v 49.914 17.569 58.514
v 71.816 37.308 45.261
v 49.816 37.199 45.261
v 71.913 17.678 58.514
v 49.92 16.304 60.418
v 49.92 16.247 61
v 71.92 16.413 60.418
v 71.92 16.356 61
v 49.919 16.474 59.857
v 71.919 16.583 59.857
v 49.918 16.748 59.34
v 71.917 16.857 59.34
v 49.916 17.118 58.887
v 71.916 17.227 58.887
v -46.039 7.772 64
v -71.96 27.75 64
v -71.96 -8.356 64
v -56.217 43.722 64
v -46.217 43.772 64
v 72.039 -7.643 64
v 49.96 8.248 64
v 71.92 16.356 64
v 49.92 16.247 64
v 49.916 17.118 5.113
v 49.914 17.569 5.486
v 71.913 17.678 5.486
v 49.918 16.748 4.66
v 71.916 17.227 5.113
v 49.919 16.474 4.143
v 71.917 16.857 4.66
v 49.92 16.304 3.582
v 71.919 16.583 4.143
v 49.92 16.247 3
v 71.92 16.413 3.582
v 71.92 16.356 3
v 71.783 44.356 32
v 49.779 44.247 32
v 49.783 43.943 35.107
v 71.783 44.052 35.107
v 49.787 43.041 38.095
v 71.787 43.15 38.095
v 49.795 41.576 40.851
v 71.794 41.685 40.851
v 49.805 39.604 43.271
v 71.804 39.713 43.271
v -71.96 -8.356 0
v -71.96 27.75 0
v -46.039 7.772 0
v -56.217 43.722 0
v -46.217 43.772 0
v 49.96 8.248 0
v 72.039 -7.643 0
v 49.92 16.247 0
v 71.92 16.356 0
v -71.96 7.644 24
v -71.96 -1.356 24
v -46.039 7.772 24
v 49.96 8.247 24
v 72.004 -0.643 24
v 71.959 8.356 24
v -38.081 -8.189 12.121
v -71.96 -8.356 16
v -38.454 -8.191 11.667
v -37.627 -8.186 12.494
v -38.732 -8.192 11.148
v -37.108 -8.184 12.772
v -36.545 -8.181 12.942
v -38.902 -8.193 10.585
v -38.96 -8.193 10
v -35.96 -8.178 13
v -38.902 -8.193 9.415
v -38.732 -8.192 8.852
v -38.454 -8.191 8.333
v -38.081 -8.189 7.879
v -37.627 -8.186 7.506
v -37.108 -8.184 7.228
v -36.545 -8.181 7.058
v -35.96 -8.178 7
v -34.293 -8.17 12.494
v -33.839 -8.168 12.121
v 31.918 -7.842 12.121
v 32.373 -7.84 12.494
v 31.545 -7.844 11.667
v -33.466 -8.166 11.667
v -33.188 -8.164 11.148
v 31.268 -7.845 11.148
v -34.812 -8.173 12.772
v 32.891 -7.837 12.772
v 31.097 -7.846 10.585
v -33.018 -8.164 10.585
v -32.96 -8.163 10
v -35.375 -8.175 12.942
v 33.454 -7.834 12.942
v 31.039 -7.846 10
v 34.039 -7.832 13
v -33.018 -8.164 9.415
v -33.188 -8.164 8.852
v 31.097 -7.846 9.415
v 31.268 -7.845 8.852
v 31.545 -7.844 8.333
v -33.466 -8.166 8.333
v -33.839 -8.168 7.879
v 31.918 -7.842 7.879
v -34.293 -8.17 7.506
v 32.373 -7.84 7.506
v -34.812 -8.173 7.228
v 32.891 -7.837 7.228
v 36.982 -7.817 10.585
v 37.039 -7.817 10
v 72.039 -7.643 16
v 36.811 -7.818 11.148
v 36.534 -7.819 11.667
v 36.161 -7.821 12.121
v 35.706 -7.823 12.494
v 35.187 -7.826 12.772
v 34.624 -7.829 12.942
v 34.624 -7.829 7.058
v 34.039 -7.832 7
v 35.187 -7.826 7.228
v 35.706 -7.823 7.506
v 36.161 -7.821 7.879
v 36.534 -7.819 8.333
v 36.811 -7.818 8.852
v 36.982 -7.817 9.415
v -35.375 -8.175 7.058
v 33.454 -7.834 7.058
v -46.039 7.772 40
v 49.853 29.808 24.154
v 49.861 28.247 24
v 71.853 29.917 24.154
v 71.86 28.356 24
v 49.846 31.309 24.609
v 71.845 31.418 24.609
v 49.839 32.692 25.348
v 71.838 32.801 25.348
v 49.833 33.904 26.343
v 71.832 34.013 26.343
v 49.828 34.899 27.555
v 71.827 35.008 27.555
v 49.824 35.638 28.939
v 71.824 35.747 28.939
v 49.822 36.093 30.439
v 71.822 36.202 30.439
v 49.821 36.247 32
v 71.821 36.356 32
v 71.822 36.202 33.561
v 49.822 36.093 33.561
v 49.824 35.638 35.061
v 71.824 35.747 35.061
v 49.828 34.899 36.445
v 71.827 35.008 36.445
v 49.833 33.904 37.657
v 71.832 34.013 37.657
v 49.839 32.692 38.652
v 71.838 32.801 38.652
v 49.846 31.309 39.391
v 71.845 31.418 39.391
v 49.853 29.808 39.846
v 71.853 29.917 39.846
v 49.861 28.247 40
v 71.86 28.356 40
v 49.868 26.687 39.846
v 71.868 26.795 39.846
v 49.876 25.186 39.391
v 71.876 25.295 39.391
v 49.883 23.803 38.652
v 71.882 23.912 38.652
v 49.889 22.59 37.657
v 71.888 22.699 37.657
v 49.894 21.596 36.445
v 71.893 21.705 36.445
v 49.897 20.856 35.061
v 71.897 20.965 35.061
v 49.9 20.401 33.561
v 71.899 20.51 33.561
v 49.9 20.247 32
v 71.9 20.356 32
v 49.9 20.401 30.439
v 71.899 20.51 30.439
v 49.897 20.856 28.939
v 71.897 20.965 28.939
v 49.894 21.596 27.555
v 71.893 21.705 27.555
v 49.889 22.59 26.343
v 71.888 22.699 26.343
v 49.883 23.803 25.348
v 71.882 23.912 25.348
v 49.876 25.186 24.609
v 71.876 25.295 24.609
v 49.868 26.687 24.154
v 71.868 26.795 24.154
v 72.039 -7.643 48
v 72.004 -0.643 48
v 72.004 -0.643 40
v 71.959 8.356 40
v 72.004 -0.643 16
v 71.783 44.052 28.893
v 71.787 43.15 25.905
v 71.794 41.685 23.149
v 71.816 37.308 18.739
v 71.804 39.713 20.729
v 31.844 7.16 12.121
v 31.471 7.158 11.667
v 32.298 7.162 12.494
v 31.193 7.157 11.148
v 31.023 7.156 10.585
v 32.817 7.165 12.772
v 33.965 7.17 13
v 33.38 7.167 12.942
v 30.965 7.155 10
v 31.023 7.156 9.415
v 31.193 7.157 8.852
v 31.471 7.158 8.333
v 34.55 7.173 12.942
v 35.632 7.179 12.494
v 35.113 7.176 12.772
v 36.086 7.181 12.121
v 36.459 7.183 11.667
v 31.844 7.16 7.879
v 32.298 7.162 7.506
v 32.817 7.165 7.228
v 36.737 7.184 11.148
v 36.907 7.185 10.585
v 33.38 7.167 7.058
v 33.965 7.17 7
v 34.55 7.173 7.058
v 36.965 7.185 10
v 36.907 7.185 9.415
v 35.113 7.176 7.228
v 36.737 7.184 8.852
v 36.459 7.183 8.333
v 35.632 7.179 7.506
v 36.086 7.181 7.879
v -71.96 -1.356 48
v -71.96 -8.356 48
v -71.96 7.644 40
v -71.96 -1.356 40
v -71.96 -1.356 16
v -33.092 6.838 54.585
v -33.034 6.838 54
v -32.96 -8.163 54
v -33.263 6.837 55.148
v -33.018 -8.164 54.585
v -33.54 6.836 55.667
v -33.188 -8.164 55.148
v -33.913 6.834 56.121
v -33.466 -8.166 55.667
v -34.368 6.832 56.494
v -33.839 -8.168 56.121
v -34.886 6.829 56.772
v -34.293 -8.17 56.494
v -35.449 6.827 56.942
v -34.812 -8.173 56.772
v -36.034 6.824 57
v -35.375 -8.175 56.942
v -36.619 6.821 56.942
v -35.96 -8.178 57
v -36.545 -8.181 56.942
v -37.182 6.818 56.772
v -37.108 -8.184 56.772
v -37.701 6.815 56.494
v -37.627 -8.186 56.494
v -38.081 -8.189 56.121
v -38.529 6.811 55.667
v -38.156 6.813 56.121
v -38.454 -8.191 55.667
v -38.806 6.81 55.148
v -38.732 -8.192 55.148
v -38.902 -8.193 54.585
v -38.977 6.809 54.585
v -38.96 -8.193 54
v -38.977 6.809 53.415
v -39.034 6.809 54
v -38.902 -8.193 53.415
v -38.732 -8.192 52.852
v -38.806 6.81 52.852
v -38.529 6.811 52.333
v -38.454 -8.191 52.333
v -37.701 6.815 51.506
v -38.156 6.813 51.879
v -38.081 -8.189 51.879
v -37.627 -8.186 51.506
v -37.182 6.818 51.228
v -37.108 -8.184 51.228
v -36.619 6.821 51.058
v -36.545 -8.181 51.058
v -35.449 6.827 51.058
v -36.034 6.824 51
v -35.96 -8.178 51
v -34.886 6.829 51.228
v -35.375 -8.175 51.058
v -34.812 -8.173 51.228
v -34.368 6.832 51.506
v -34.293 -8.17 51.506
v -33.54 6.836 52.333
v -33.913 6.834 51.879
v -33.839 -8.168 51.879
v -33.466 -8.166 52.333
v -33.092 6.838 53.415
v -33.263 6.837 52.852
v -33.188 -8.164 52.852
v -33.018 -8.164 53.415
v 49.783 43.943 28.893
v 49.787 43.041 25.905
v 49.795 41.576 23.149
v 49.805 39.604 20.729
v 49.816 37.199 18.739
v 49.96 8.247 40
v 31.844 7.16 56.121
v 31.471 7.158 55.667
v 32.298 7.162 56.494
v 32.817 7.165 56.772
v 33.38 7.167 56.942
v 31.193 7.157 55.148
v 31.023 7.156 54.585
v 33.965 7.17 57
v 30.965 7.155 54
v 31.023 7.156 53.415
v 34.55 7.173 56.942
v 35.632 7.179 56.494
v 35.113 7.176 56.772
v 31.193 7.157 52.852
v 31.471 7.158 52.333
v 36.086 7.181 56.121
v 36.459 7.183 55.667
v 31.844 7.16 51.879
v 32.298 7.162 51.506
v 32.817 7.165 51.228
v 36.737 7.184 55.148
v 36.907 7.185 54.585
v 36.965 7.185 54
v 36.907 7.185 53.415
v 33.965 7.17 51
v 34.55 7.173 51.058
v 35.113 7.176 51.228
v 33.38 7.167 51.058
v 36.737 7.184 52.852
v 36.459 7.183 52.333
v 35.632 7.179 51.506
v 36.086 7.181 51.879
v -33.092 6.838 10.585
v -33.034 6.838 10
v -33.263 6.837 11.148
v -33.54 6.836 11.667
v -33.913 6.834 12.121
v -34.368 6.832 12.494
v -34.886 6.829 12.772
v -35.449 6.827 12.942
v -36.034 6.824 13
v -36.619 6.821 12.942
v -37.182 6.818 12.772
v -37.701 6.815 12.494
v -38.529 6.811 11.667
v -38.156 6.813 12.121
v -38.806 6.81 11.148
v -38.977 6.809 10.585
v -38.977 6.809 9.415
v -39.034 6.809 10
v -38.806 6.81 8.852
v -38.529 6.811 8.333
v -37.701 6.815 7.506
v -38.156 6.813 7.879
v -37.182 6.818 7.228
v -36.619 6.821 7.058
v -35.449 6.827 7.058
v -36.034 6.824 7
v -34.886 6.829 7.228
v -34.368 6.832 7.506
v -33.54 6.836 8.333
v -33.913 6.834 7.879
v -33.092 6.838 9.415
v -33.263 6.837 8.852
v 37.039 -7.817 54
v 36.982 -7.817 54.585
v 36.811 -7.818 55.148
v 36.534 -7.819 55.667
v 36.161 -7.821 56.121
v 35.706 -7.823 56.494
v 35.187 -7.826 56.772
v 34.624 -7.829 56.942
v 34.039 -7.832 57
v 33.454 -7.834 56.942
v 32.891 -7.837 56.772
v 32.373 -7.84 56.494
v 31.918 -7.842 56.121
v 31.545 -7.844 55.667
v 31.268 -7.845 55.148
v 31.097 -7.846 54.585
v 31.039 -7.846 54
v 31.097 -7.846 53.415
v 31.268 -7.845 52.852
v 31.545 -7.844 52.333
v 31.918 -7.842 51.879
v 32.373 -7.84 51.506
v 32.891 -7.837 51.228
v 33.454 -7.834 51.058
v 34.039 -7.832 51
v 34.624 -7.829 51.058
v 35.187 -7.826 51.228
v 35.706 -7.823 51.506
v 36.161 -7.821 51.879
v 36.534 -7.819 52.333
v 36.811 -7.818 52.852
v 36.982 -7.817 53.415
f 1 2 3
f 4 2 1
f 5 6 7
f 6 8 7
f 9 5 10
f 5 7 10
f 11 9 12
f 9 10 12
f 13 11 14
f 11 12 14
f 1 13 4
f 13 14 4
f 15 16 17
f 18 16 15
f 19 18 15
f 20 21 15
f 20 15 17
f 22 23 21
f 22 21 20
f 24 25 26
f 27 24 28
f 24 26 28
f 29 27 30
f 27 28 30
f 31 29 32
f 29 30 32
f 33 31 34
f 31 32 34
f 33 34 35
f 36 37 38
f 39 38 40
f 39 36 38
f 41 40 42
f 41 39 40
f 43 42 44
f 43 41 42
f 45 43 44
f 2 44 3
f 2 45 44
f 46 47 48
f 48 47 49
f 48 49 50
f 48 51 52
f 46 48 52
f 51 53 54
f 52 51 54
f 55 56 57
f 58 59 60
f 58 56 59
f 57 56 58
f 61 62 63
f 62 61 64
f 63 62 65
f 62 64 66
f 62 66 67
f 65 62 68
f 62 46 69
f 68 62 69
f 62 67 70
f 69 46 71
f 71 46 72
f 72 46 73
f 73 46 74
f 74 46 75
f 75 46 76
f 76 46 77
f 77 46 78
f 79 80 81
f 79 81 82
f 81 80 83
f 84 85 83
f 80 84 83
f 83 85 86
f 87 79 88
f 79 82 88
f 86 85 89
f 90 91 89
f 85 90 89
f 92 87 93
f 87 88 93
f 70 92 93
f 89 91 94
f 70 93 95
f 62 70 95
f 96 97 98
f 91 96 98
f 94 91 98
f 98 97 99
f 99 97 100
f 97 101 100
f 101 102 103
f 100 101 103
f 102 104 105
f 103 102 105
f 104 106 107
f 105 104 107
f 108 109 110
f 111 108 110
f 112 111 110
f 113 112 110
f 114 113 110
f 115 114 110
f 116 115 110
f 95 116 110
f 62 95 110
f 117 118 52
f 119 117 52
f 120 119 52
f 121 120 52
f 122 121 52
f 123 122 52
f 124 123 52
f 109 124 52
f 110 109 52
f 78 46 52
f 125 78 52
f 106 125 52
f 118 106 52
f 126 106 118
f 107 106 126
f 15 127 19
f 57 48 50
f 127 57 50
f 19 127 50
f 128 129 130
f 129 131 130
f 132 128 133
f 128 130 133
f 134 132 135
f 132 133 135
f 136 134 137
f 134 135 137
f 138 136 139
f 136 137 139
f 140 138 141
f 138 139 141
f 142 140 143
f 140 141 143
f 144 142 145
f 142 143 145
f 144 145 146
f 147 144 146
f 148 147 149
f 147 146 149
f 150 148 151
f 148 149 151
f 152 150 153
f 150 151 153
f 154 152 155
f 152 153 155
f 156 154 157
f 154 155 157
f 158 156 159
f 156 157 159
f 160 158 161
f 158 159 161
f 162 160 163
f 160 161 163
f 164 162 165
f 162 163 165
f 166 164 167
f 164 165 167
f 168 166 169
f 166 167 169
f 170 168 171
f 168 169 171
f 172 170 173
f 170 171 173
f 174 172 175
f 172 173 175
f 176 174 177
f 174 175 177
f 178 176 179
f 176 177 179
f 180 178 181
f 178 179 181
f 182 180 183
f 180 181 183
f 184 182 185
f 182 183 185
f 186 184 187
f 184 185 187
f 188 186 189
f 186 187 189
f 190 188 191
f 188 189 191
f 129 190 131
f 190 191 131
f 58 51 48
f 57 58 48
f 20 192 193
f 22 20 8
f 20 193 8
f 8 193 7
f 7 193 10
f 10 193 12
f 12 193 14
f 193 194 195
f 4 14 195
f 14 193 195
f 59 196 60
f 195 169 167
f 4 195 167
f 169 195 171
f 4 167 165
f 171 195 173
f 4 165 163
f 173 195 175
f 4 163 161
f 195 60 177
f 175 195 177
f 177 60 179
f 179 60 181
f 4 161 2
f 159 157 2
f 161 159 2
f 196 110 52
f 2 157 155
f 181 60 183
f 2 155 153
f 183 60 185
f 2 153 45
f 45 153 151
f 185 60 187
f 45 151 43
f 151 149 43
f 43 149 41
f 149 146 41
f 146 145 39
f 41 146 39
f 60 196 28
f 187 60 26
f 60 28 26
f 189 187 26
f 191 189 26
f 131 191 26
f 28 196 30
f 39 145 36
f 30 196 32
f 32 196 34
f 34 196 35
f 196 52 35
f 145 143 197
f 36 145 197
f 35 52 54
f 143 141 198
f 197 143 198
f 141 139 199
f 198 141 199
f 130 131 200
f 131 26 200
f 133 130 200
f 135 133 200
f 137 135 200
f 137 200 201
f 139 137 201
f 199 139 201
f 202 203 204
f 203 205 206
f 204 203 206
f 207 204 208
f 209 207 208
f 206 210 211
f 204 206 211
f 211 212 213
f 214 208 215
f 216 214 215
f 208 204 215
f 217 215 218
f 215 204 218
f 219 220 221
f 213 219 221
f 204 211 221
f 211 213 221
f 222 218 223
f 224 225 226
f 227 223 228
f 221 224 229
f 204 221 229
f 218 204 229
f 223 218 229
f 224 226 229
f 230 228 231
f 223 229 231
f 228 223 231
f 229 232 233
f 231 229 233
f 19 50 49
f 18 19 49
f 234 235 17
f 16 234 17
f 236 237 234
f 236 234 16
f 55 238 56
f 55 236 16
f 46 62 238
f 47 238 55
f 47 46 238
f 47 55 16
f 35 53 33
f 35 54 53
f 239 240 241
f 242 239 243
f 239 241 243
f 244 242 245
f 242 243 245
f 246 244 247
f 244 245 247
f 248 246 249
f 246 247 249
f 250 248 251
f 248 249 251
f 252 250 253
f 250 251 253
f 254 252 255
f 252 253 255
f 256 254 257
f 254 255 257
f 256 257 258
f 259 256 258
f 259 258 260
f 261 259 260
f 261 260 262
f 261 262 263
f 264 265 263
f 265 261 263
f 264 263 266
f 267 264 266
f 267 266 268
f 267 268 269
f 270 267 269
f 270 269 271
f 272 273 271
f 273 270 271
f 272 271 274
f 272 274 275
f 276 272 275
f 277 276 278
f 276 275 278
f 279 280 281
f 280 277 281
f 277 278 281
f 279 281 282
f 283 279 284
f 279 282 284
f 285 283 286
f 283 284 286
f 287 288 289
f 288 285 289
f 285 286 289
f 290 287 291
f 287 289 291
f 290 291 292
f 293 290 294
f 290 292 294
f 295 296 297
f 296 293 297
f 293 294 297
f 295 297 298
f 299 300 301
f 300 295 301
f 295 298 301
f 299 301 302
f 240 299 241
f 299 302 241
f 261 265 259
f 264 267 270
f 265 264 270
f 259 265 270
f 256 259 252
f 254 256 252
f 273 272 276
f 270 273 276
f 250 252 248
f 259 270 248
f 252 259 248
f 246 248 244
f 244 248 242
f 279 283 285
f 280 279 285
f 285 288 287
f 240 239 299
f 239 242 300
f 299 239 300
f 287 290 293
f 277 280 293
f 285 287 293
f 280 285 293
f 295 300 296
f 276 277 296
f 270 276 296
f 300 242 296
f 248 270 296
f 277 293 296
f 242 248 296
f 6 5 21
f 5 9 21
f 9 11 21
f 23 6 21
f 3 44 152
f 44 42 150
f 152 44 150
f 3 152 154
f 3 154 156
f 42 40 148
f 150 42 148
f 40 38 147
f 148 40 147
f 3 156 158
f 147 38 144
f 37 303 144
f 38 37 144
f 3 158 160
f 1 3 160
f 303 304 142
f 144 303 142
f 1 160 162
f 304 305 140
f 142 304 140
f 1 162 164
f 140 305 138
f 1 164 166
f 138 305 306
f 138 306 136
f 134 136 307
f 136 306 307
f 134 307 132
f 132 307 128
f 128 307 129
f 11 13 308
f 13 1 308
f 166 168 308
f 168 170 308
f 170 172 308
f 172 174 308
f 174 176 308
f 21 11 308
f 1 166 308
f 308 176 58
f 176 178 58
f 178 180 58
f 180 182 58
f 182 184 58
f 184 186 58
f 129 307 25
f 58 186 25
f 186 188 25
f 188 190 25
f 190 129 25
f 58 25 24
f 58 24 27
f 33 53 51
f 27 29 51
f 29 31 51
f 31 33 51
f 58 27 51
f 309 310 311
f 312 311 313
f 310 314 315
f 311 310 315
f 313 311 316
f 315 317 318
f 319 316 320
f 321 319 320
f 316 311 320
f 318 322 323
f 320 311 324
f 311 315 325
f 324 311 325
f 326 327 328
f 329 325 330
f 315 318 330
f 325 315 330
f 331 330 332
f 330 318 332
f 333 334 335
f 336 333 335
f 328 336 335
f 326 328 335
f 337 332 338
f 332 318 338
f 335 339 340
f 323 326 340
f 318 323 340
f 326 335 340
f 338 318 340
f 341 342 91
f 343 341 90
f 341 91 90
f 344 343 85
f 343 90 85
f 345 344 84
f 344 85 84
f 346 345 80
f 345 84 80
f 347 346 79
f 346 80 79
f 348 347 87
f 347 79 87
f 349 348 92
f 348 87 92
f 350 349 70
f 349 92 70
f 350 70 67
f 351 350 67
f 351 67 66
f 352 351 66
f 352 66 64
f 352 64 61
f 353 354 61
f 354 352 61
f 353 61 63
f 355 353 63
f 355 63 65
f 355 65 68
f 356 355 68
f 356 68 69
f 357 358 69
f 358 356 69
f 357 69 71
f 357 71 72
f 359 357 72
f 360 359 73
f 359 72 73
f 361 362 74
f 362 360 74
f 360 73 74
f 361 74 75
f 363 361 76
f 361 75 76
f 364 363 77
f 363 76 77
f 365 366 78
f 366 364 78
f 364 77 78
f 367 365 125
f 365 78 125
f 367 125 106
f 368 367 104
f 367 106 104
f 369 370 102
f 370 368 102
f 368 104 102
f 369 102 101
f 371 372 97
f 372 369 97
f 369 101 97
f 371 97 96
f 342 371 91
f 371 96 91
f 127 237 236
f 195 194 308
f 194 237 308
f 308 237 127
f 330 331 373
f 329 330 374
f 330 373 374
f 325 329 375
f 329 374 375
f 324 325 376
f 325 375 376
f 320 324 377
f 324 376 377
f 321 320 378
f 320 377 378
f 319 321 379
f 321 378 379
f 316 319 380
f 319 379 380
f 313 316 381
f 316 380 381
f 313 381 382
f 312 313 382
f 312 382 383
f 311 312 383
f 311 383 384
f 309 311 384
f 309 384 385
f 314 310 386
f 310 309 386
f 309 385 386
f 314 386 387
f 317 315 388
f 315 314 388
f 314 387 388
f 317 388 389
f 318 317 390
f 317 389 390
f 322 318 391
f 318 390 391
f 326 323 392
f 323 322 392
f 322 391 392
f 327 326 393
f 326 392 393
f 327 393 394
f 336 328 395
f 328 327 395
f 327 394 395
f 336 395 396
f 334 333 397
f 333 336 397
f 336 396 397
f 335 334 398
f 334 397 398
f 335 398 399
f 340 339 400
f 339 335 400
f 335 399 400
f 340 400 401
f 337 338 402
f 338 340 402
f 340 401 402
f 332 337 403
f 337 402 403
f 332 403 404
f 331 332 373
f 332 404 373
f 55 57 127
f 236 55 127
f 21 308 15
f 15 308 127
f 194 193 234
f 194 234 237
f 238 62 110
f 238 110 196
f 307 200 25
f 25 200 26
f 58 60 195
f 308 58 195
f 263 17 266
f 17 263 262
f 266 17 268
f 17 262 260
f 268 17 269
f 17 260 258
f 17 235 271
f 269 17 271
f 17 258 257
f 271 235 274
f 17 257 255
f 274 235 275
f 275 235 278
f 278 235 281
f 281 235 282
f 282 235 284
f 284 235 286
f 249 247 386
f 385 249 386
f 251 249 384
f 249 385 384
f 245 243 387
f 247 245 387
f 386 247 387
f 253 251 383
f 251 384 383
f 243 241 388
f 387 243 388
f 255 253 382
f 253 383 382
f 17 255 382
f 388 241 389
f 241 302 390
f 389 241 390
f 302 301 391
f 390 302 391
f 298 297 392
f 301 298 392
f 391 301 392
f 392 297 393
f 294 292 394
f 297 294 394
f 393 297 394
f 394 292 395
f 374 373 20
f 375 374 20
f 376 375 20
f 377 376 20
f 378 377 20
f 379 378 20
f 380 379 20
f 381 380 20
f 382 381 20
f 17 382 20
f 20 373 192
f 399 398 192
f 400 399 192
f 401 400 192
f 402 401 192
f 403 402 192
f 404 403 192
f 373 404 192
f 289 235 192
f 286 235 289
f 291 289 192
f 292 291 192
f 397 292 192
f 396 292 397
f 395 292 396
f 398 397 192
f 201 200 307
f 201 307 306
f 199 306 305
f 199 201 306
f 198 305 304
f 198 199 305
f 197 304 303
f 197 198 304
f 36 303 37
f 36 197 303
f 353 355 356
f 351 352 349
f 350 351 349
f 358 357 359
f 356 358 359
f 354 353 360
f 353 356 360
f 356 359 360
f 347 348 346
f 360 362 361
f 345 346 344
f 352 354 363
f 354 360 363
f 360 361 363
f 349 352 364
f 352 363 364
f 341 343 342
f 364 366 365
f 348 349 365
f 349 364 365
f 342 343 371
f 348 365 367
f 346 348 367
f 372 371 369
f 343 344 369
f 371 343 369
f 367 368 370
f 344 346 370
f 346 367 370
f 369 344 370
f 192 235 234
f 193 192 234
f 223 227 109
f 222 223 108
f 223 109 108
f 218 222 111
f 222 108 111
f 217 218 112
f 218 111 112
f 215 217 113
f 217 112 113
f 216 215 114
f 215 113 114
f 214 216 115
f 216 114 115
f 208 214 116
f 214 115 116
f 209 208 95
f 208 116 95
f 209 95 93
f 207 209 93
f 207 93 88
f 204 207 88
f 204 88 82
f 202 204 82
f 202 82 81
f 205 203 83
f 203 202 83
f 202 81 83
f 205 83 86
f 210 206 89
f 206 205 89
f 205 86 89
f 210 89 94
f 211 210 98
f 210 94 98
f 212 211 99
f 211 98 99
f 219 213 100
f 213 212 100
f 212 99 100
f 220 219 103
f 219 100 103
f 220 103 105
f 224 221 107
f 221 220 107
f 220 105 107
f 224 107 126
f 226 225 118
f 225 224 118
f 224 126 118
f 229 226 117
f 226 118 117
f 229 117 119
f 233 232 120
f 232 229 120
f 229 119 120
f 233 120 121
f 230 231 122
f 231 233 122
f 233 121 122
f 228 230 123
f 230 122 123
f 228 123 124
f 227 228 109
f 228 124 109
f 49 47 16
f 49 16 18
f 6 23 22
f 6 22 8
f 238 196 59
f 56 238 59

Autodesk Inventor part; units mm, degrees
ref_plane "YZ Plane" through (0, 0, 0) normal (1, 0, 0) x (0, 1, 0)
ref_plane "XZ Plane" through (0, 0, 0) normal (0, 1, 0) x (-1, 0, 0)
ref_plane "XY Plane" through (0, 0, 0) normal (0, 0, 1) x (1, 0, 0)
sketch "Sketch1" plane through (0, 0, 0) normal (0, 0, 1) x (1, 0, 0)
  line L0 (-71.9595, -8.3565) -> (72.0387, -7.6433)
  line L1 (72.0387, -7.6433) -> (71.7812, 44.356)
  line L2 (71.7812, 44.356) -> (49.7815, 44.2471)
  line L3 (49.7815, 44.2471) -> (49.9598, 8.2475)
  line L4 (49.9598, 8.2475) -> (-46.0391, 7.7721)
  line L5 (-46.0391, 7.7721) -> (-46.2173, 43.7717)
  line L6 (-46.2173, 43.7717) -> (-56.2172, 43.7221)
  line L7 (-71.9595, -8.3565) -> (-71.9595, 27.7497)
  line L8 (-71.9595, 27.7497) -> (-56.2172, 43.7221)
  point P0 (0, 0)
  dimension "d0" = 144
  dimension "d1" = 52
  dimension "d2" = 22
  dimension "d3" = 36
  dimension "d4" = 96
  dimension "d5" = 36
  dimension "d6" = 10
  dimension "d8" = 72
  dimension "d9" = 16
  dimension "d10" = 8
extrude "Extrusion1" add sketch "Sketch1" along normal blind 64
sketch "Sketch3" plane through (71.7812, 44.356, 64) normal (0.9999877, 0.0049523, 0) x (0, 0, -1)
  line L0 (64, -52) -> (64, 0) projected
  line L1 (0, -52) -> (0, 0) projected
  line L2 (48, -52) -> (48, -45)
  line L3 (40, -45) -> (40, -36)
  line L4 (48, -45) -> (40, -45)
  line L5 (40, -36) -> (32, -36)
  line L6 (64, -36) -> (0, -36) projected
  line L7 (16, -52) -> (16, -45)
  line L8 (24, -45) -> (24, -36)
  line L9 (16, -45) -> (24, -45)
  line L10 (24, -36) -> (32, -36)
  line L11 (16, -52) -> (48, -52)
  line L12 (64, -52) -> (0, -52) projected
  line L13 (64, -36) -> (64, 0) projected
  arc A0 (58.5136, -26.6786) -> (61, -28) centre (61, -25) ccw
  arc A1 (45.2611, -7.0477) -> (18.7389, -7.0477) centre (32, -16) ccw
  circle A2 centre (32, -16) radius 8
  line L14 (64, 0) -> (0, 0) projected
  line L15 (45.2611, -7.0477) -> (58.5136, -26.6786)
  line L16 (64, -28) -> (61, -28)
  line L17 (64, -15.8943) -> (0, -15.8943) projected
  arc A3 (3, -28) -> (5.4864, -26.6786) centre (3, -25) ccw
  line L18 (18.7389, -7.0477) -> (5.4864, -26.6786)
  line L19 (0, -28) -> (3, -28)
  line L20 (0, -36) -> (0, 0) projected
  line L21 (0, -28) -> (0, 0)
  line L22 (64, 0) -> (0, 0) projected
  line L23 (0, 0) -> (64, 0)
  line L24 (64, 0) -> (64, -28)
  point P0 (64, -44)
  point P1 (32, 0)
  point P2 (0, -28)
  point P3 (64, -28)
  dimension "d13" = 64
  dimension "d16" = 7
  dimension "d18" = 32
  dimension "d19" = 16
  dimension "d20" = 16
  dimension "d21" = 9
  dimension "d24" = 24
  dimension "d26" = 6
  dimension "d27" = 32
  dimension "d28" = 16
  dimension "d29" = 32
  dimension "d30" = 64
extrude "Extrusion2" cut sketch "Sketch3" against normal through all contours L11 L7 L9 L8 L6 L5 L3 L4 L2
extrude "Extrusion3" cut sketch "Sketch3" against normal blind 22 contours L16 A0 L15 L17 L0 | L17 L15 A1 L14 L0 | A1 L18 L17 L1 L14 | L17 A2 | A2 L17 | L1 L17 L18 A3 L19
sketch "Sketch4" plane through (-45.9598, -8.2277, 64) normal (-0.0049523, 0.9999877, 0) x (0.9999877, 0.0049523, 0)
  line L0 (118, 16) -> (118, 0) projected
  line L1 (96, 0) -> (0, 0) projected
  circle A0 centre (80, 10) radius 3
  circle A1 centre (10, 10) radius 3
  line L2 (-40.7838, 32) -> (143.3901, 32)
  circle A2 centre (80, 54) radius 3
  circle A3 centre (10, 54) radius 3
  point P0 (46, 64)
  dimension "d35" = 6
  dimension "d37" = 6
extrude "Extrusion4" cut sketch "Sketch4" along normal blind 15
equation "\"d8\" = 0.5 * d0"
equation "\"d10\" = 0.5 * d9"
equation "\"d29\" = 0.5 * d30"
properties part number "Parte2_Base" material "Steel, Carbon"
